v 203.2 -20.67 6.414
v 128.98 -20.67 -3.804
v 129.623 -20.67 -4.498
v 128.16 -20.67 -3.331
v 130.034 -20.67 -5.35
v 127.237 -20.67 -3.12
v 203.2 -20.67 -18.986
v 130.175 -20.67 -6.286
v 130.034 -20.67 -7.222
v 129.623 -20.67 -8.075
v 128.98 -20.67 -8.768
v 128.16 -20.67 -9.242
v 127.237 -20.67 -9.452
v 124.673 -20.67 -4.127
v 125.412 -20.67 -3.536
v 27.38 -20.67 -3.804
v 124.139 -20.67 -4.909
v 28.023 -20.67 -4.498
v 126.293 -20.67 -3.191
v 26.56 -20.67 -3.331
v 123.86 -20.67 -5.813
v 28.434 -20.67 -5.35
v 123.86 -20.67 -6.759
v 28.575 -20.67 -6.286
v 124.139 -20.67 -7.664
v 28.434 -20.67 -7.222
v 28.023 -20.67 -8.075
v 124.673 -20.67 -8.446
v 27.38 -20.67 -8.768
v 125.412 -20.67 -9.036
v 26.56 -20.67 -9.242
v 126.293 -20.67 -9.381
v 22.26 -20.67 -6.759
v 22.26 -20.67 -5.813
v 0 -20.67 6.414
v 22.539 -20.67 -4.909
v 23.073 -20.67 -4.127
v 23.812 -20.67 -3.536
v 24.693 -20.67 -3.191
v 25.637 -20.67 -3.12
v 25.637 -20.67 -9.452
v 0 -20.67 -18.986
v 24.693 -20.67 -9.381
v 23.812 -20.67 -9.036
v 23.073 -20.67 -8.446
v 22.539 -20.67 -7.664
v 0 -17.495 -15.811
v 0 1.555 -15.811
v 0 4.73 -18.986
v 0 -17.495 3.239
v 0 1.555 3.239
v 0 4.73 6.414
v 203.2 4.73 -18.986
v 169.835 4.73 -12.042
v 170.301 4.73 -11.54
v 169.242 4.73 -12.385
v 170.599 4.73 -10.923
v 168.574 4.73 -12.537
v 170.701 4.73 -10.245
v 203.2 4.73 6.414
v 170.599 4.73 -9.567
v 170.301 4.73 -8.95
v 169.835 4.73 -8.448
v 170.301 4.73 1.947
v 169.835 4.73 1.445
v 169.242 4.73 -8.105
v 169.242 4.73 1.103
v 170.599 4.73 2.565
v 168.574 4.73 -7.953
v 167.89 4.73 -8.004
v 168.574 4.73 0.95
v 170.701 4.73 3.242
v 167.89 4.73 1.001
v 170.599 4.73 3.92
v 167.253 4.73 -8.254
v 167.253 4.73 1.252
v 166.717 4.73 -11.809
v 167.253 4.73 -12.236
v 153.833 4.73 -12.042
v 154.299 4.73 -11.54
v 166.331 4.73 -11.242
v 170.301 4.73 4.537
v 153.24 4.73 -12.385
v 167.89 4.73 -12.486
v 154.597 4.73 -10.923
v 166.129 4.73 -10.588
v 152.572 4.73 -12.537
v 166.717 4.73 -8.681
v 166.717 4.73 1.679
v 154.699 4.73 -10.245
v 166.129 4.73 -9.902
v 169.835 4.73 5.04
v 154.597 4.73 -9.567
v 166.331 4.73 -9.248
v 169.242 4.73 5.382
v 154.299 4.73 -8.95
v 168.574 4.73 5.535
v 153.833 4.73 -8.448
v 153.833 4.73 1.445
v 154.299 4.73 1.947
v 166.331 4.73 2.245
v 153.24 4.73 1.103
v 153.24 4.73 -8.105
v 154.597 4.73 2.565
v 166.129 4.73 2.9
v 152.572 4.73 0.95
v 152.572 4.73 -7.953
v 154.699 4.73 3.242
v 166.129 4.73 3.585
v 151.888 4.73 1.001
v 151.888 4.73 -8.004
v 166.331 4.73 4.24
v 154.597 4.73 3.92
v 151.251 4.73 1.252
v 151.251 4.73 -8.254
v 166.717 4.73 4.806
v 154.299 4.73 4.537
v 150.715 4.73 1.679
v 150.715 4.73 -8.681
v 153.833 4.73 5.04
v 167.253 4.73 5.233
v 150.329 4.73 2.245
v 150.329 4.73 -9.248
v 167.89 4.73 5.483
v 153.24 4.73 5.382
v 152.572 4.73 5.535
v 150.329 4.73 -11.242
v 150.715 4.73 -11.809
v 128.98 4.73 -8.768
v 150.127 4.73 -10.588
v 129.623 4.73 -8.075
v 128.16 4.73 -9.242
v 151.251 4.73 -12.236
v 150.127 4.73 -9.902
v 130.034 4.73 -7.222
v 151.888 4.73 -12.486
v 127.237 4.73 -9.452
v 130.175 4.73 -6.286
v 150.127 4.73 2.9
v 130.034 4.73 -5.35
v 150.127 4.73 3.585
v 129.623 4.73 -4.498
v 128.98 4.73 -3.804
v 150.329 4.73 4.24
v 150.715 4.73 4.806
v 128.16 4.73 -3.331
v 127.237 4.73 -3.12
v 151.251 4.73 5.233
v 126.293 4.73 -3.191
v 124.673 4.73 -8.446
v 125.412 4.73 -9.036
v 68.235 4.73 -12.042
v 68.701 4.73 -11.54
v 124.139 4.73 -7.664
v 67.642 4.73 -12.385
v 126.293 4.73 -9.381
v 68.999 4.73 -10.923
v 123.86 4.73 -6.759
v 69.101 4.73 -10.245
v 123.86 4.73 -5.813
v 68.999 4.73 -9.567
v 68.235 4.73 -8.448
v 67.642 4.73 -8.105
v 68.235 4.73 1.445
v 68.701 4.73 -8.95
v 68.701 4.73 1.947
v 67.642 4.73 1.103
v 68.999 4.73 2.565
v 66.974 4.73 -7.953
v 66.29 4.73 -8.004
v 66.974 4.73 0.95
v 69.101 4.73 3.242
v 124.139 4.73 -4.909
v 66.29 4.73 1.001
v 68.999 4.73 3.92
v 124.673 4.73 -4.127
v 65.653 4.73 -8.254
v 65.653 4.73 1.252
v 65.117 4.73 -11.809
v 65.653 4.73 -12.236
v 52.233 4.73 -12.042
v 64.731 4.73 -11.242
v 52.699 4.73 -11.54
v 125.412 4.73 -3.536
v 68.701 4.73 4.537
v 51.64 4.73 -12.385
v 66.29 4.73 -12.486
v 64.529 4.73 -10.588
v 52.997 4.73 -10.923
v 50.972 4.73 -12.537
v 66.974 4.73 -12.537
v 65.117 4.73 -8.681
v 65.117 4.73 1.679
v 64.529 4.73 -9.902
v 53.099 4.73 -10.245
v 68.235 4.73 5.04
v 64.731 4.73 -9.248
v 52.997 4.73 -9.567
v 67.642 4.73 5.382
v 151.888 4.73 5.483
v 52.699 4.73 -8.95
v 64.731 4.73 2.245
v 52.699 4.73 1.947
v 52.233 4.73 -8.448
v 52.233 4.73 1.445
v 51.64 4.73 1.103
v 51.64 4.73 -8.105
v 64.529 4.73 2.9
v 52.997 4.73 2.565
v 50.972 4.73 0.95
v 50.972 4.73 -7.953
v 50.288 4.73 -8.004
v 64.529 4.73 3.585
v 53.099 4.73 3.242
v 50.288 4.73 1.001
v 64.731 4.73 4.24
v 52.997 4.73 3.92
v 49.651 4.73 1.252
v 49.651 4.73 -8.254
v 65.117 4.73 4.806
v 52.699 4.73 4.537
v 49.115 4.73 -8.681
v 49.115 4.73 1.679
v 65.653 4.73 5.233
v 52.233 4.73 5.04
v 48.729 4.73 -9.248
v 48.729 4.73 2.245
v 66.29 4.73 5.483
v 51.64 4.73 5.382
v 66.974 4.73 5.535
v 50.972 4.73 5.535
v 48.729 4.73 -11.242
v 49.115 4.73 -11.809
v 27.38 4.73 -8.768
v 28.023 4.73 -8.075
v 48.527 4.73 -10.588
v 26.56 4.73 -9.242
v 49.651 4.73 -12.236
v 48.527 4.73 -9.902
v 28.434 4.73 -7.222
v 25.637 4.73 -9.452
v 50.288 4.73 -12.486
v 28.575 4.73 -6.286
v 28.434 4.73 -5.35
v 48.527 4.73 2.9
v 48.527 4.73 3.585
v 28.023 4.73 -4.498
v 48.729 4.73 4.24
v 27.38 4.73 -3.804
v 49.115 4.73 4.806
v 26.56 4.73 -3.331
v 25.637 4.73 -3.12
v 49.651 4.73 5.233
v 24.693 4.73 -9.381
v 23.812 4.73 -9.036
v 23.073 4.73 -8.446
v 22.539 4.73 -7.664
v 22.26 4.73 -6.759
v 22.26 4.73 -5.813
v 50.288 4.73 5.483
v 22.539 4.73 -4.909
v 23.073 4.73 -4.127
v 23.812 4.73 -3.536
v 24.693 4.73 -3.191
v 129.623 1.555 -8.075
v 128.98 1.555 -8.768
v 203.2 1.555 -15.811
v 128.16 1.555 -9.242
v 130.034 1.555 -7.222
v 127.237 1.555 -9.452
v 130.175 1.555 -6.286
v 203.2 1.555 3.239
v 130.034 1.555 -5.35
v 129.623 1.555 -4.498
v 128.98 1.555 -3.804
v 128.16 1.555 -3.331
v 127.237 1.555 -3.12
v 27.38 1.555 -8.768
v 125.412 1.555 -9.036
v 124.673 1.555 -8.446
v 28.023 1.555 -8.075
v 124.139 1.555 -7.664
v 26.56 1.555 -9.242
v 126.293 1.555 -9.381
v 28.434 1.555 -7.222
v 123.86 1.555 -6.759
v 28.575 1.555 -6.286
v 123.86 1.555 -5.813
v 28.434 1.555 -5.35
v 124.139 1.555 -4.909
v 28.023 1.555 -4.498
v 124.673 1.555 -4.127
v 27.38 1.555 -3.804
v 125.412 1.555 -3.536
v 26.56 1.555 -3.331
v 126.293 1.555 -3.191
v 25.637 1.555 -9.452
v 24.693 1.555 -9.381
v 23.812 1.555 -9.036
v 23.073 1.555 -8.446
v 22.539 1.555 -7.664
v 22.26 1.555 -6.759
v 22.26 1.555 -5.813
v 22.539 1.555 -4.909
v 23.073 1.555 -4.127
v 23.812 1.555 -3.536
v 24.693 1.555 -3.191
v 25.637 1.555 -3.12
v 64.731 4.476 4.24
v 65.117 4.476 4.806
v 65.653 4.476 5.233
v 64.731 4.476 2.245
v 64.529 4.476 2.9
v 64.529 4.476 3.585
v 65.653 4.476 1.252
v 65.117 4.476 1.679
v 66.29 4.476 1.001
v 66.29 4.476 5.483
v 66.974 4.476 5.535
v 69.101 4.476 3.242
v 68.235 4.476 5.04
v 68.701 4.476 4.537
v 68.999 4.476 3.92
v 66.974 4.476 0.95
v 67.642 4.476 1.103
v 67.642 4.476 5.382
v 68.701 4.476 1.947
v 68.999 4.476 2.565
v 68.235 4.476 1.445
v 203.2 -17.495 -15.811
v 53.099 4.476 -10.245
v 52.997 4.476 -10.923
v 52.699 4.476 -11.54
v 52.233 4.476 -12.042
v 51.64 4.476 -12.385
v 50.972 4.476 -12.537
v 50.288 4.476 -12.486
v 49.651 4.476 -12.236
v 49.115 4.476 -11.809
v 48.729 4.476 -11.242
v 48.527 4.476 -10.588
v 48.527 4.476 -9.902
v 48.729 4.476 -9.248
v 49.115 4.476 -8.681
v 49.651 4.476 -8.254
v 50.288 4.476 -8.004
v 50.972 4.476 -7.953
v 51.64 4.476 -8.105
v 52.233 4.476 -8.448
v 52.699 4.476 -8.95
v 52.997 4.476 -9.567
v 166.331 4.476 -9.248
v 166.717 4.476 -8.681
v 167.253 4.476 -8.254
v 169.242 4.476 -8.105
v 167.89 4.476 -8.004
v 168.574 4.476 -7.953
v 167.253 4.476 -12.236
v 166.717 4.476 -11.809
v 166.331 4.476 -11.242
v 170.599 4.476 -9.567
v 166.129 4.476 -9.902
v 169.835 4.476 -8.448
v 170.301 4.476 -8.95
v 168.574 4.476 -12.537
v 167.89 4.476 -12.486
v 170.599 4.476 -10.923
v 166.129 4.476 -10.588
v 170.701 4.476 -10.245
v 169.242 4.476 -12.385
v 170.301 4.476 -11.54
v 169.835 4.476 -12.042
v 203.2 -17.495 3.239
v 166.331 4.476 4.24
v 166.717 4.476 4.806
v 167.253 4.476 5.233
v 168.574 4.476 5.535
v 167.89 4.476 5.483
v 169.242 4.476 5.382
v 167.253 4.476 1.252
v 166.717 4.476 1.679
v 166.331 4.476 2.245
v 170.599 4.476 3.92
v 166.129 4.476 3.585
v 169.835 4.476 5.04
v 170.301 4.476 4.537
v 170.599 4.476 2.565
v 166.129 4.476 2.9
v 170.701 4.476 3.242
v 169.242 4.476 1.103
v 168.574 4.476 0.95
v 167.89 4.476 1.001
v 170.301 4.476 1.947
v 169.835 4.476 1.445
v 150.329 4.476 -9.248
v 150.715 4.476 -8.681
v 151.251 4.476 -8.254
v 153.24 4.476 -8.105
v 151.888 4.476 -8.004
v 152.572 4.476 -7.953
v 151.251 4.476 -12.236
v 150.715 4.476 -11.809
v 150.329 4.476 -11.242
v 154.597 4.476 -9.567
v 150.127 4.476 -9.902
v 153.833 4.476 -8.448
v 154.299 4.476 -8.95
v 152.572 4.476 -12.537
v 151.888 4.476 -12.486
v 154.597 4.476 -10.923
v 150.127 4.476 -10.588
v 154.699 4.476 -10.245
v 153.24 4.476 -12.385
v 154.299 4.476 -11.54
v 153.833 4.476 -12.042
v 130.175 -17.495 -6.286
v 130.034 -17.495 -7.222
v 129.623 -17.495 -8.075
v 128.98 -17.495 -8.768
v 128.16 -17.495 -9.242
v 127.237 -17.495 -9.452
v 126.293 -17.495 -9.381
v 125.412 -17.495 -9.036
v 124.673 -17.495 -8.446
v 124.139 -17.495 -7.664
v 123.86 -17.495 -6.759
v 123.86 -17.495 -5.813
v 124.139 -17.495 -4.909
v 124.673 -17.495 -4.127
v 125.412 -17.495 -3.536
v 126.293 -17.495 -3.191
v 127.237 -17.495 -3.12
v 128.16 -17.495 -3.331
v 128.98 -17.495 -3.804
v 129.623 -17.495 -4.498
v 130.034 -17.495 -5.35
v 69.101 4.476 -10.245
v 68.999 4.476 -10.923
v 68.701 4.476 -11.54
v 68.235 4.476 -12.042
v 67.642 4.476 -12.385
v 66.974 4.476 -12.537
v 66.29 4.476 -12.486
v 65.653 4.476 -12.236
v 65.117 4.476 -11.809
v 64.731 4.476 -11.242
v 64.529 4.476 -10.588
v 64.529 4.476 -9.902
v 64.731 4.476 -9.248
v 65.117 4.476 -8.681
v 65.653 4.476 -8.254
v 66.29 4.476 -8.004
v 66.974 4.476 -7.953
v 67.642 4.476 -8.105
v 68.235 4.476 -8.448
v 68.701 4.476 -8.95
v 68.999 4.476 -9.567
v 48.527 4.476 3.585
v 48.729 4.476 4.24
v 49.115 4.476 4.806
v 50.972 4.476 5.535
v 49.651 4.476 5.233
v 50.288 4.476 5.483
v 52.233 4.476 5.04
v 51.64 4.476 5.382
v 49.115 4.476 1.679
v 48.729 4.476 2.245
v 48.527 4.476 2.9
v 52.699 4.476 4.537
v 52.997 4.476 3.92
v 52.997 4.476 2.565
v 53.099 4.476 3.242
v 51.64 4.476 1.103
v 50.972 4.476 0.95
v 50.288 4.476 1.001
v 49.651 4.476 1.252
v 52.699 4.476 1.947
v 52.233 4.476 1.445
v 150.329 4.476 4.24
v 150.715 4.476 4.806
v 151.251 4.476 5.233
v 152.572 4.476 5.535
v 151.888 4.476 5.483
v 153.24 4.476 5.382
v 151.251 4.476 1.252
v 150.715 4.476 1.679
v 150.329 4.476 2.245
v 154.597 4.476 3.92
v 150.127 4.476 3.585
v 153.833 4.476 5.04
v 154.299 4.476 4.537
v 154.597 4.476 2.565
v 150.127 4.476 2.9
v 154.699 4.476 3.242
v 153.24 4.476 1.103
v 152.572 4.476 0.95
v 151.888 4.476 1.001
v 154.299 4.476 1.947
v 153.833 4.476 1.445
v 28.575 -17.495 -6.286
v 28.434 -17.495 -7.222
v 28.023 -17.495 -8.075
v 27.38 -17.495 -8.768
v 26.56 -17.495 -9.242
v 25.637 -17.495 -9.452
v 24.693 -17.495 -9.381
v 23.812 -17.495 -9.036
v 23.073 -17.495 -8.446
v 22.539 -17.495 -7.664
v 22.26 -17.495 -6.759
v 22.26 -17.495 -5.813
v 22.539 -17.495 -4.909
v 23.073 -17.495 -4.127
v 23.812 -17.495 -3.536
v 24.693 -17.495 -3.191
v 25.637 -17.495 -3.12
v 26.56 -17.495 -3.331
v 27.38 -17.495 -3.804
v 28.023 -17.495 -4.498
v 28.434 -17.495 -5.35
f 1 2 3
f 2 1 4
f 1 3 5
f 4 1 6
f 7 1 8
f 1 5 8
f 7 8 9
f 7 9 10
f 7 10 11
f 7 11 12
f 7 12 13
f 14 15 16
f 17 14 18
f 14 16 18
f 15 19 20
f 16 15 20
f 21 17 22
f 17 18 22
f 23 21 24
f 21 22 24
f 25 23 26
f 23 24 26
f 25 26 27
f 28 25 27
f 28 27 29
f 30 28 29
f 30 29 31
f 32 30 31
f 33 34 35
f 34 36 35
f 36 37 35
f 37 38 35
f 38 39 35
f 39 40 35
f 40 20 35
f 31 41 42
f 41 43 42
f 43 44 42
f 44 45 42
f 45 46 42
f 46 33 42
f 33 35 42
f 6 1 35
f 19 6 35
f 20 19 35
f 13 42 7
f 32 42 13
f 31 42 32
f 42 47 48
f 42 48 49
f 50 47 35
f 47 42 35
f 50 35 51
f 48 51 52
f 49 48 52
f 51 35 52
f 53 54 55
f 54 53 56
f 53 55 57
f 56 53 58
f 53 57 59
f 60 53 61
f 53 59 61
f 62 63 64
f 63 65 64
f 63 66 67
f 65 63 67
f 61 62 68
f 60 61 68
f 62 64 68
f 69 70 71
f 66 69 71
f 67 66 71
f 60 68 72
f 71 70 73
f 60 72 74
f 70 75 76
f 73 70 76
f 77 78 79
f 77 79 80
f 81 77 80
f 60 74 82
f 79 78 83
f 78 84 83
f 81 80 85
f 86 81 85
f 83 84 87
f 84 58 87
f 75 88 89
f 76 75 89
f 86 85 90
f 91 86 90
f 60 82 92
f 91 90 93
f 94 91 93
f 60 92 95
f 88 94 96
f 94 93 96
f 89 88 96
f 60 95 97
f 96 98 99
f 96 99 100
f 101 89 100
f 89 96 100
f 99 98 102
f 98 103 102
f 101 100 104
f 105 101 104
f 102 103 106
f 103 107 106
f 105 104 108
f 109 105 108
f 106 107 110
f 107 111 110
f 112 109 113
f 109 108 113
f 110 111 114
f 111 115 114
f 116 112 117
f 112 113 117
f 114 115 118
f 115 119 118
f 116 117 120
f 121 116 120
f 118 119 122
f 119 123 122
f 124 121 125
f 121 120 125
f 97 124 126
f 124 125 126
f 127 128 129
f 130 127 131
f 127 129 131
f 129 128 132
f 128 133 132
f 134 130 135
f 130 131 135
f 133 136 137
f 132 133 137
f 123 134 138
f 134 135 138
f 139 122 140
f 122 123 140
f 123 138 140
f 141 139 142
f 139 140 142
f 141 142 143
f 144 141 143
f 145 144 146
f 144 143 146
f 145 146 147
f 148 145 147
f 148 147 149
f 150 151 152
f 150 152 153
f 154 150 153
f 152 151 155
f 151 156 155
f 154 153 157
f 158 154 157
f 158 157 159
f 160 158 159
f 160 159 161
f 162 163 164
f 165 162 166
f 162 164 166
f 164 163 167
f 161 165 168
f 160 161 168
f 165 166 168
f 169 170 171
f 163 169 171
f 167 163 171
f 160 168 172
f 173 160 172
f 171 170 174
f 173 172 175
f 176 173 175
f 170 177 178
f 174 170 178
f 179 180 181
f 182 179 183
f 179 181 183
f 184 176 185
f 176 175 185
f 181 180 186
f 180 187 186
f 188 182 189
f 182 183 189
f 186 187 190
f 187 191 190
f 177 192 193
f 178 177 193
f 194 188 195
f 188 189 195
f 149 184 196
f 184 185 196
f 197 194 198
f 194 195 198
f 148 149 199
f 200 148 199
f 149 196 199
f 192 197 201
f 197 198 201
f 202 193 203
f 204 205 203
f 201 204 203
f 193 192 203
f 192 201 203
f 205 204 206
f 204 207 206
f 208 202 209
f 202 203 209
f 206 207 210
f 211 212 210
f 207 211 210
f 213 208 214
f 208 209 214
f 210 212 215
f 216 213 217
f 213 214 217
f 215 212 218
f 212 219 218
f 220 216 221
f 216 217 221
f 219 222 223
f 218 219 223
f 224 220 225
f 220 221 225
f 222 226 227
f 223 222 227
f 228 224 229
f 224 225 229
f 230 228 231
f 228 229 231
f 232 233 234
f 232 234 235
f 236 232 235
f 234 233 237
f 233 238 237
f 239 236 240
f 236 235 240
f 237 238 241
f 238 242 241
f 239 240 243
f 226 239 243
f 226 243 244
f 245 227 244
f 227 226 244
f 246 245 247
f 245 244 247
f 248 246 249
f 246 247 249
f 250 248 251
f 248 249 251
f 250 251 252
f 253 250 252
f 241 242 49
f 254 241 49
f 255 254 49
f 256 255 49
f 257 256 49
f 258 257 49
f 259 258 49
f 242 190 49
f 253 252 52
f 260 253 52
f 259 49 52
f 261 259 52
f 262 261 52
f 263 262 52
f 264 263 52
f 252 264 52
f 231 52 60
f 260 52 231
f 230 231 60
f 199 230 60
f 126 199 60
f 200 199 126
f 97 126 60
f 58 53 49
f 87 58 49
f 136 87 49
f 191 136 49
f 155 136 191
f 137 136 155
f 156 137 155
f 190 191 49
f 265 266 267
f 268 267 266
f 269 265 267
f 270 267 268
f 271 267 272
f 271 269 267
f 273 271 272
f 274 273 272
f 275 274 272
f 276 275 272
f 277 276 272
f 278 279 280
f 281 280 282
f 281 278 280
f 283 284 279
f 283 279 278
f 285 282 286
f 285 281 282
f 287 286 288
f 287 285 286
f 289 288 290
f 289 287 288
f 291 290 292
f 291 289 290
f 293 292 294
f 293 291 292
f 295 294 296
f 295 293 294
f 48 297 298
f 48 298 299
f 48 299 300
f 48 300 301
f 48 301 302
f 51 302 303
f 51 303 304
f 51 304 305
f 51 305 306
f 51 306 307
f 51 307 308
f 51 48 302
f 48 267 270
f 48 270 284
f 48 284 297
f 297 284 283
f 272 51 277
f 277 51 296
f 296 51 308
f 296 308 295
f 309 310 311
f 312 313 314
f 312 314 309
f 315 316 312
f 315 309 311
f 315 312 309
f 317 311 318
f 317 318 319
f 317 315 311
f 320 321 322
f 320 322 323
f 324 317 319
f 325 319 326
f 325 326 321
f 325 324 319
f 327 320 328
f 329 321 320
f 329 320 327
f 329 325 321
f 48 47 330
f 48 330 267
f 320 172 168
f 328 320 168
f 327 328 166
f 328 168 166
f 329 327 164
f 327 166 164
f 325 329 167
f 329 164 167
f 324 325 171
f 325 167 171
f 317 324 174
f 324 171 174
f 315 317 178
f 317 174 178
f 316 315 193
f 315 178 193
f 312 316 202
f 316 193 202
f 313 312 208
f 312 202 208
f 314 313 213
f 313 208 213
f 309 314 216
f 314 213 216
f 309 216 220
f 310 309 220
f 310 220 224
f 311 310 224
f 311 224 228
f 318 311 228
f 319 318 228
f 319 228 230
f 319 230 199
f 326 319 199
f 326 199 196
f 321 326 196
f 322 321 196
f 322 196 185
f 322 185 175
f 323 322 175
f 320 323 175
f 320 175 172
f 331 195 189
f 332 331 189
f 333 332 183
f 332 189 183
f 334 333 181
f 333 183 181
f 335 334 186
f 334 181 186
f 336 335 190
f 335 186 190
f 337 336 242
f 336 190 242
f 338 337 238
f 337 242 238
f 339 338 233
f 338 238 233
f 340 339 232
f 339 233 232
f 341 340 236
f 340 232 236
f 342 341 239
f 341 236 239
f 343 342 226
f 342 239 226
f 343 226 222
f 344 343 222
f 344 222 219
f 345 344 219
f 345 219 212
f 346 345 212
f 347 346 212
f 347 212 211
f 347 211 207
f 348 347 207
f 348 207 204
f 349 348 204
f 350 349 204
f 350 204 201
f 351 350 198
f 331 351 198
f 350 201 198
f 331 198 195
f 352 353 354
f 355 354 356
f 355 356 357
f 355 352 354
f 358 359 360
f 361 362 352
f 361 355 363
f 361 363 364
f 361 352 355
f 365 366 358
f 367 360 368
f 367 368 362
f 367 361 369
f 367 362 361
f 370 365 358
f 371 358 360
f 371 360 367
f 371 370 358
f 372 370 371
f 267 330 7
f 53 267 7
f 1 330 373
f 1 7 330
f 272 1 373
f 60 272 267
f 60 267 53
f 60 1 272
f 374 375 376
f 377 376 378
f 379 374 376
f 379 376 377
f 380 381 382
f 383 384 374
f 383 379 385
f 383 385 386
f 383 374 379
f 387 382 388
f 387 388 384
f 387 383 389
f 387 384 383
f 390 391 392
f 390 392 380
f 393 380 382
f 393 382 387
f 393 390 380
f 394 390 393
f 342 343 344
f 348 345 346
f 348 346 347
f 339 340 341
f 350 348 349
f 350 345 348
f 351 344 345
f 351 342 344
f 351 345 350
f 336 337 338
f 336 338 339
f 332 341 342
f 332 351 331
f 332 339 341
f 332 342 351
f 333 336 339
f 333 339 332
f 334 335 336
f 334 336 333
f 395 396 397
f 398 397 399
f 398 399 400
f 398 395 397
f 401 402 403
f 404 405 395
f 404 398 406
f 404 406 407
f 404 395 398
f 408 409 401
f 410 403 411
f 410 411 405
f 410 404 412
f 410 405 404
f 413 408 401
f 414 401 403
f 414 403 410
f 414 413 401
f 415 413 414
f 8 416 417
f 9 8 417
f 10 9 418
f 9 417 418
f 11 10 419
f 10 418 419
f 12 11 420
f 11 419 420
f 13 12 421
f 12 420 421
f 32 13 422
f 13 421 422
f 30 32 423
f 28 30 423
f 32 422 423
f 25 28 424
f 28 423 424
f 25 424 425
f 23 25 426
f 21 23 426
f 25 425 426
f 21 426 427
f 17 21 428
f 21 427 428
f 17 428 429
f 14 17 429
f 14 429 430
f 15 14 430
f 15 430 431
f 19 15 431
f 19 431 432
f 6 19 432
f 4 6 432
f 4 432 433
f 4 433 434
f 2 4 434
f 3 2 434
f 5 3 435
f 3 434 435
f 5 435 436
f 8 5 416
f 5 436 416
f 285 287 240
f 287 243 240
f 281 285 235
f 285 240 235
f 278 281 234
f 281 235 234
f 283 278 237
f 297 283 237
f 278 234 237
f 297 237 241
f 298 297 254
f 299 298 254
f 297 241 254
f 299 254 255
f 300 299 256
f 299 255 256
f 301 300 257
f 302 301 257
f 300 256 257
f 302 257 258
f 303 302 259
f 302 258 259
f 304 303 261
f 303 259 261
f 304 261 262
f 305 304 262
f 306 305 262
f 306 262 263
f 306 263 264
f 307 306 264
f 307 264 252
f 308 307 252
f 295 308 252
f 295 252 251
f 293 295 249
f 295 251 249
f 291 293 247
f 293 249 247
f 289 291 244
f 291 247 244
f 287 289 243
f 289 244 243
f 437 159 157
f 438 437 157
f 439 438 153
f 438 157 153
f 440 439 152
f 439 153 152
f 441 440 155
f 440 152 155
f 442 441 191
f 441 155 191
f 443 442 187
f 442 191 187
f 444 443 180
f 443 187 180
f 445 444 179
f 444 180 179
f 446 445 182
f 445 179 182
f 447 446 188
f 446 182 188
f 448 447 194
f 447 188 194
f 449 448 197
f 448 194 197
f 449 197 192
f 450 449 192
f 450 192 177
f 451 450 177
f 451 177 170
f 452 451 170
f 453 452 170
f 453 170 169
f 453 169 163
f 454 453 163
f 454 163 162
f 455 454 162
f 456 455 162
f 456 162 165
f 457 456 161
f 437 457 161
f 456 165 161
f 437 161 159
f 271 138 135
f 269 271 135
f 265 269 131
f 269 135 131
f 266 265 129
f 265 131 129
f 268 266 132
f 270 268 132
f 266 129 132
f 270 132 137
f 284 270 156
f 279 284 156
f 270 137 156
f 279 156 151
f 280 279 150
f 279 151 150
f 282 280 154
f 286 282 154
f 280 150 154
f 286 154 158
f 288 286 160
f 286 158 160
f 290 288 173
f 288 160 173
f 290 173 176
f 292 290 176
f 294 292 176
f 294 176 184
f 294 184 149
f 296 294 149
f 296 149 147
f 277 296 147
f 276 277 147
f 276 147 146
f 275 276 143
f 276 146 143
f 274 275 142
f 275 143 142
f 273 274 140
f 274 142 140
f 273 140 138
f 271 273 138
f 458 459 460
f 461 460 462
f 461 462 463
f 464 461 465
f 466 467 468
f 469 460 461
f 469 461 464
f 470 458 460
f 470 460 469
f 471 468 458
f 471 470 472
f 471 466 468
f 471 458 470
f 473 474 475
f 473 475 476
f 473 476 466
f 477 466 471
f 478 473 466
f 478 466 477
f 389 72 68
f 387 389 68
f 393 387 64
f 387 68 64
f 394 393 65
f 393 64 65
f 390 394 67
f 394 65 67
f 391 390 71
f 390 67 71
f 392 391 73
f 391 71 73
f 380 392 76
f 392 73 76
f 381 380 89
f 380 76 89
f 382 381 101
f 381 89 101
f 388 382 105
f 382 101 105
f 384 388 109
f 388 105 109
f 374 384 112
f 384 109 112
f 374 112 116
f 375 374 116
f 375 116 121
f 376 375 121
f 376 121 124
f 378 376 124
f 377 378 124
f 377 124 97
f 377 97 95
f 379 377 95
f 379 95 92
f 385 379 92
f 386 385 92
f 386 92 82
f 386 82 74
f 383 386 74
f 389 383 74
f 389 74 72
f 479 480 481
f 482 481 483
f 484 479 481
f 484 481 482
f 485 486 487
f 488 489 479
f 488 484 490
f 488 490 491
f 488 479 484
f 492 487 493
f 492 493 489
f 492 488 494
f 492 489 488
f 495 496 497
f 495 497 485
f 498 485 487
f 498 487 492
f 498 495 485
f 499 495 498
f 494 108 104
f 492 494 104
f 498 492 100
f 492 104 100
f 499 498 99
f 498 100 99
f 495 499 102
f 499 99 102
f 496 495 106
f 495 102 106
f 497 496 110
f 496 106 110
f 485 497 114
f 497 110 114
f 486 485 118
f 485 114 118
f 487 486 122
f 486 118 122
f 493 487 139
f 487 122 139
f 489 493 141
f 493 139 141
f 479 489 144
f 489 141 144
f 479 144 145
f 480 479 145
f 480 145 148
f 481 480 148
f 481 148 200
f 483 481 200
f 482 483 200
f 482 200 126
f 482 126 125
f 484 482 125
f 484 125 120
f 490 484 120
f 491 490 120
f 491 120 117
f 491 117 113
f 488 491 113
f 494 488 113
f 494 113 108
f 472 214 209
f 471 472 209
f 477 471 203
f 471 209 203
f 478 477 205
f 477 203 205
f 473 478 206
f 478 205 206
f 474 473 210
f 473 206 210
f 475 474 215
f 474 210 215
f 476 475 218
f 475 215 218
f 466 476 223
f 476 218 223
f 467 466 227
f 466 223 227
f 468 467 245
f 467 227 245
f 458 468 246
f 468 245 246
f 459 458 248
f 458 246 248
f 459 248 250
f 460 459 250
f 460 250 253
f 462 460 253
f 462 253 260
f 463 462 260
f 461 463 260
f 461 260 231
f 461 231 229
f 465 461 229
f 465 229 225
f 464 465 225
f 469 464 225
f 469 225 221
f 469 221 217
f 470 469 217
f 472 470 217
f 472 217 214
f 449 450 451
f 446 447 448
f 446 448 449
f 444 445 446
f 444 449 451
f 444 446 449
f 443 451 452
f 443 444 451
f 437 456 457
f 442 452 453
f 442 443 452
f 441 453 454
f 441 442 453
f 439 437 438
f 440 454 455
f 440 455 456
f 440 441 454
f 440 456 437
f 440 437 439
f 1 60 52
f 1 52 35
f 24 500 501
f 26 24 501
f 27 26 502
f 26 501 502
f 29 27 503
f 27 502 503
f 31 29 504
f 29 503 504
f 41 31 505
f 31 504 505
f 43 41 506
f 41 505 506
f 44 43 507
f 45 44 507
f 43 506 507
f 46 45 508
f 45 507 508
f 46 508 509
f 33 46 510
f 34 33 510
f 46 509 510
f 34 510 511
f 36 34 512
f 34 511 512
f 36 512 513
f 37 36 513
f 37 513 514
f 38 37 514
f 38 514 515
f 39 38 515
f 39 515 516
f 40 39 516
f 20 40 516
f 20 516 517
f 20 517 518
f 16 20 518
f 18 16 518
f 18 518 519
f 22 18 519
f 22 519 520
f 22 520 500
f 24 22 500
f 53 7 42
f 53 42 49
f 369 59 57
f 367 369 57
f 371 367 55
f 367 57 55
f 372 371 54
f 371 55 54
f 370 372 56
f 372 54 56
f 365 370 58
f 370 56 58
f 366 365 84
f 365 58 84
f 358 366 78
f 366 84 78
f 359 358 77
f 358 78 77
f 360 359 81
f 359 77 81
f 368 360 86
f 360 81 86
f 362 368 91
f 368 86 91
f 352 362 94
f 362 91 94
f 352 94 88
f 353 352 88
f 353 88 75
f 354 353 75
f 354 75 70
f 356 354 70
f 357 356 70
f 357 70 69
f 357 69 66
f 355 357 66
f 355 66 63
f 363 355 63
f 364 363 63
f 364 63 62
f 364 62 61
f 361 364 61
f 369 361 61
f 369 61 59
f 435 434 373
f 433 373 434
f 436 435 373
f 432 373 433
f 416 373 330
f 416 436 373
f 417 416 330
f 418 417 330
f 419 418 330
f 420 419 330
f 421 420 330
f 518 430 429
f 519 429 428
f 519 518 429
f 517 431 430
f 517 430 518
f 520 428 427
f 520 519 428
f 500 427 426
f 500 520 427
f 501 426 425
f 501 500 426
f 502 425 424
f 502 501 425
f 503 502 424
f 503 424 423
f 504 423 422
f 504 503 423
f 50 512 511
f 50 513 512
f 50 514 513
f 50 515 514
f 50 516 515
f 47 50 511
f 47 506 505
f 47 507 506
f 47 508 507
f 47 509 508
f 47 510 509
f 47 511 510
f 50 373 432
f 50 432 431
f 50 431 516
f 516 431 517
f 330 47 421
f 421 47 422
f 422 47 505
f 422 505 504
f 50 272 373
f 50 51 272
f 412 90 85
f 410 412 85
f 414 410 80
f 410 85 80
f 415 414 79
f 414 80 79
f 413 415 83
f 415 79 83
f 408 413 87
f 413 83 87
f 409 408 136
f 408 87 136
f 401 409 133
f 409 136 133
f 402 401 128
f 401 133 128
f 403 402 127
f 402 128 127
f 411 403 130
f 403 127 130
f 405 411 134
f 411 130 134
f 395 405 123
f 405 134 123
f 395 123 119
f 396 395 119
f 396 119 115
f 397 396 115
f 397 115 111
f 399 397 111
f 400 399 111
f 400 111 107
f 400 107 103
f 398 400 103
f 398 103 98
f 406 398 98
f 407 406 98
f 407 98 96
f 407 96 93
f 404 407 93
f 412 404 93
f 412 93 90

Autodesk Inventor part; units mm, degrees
ref_plane "YZ Plane" through (0, 0, 0) normal (1, 0, 0) x (0, 1, 0)
ref_plane "XZ Plane" through (0, 0, 0) normal (0, 1, 0) x (-1, 0, 0)
ref_plane "XY Plane" through (0, 0, 0) normal (0, 0, 1) x (1, 0, 0)
sketch "Sketch1" plane through (0, 0, 0) normal (1, 0, 0) x (0, 1, 0)
  line L0 (4.7302, 6.4139) -> (-20.6698, 6.4139)
  line L1 (-20.6698, 6.4139) -> (-20.6698, -18.9861)
  line L2 (-20.6698, -18.9861) -> (4.7302, -18.9861)
  line L3 (4.7302, -18.9861) -> (4.7302, 6.4139)
  line L4 (1.5552, 3.2389) -> (-17.4948, 3.2389)
  line L5 (-17.4948, 3.2389) -> (-17.4948, -15.8111)
  line L6 (-17.4948, -15.8111) -> (1.5552, -15.8111)
  line L7 (1.5552, -15.8111) -> (1.5552, 3.2389)
  point P0 (0, 0)
  dimension "d0" = 25.4
  dimension "d1" = 25.4
  dimension "d2" = 3.175
extrude "Extrusion1" add sketch "Sketch1" along normal blind 203.2
sketch "Sketch2" plane through (0, 4.7302, 6.4139) normal (0, 1, 0) x (1, 0, 0)
  line L0 (0, 3.175) -> (0, 22.225) projected
  circle A0 centre (25.4, 12.7) radius 3.175
  circle A1 centre (127, 12.7) radius 3.175
  point P0 (0, 6.4139)
  dimension "d6" = 6.35
  dimension "d8" = 6.35
extrude "Extrusion2" cut sketch "Sketch2" against normal blind 203.2
sketch "Sketch3" plane through (0, 4.7302, 6.4139) normal (0, 1, 0) x (1, 0, 0)
  line L0 (0, 25.4) -> (203.2, 25.4) projected
  line L1 (0, 22.225) -> (0, 3.175) projected
  circle A0 centre (66.802, 16.6589) radius 2.2987
  circle A1 centre (66.802, 3.1715) radius 2.2987
  circle A2 centre (50.8, 3.1715) radius 2.2987
  circle A3 centre (152.4, 16.6589) radius 2.2987
  circle A4 centre (152.4, 3.1715) radius 2.2987
  circle A5 centre (168.402, 3.1715) radius 2.2987
  circle A6 centre (168.402, 16.6589) radius 2.2987
  circle A7 centre (50.8, 16.6589) radius 2.2987
  point P0 (0, 6.4139)
extrude "Extrusion3" cut sketch "Sketch3" against normal blind 0.254
properties part number "Zero Twosday"
